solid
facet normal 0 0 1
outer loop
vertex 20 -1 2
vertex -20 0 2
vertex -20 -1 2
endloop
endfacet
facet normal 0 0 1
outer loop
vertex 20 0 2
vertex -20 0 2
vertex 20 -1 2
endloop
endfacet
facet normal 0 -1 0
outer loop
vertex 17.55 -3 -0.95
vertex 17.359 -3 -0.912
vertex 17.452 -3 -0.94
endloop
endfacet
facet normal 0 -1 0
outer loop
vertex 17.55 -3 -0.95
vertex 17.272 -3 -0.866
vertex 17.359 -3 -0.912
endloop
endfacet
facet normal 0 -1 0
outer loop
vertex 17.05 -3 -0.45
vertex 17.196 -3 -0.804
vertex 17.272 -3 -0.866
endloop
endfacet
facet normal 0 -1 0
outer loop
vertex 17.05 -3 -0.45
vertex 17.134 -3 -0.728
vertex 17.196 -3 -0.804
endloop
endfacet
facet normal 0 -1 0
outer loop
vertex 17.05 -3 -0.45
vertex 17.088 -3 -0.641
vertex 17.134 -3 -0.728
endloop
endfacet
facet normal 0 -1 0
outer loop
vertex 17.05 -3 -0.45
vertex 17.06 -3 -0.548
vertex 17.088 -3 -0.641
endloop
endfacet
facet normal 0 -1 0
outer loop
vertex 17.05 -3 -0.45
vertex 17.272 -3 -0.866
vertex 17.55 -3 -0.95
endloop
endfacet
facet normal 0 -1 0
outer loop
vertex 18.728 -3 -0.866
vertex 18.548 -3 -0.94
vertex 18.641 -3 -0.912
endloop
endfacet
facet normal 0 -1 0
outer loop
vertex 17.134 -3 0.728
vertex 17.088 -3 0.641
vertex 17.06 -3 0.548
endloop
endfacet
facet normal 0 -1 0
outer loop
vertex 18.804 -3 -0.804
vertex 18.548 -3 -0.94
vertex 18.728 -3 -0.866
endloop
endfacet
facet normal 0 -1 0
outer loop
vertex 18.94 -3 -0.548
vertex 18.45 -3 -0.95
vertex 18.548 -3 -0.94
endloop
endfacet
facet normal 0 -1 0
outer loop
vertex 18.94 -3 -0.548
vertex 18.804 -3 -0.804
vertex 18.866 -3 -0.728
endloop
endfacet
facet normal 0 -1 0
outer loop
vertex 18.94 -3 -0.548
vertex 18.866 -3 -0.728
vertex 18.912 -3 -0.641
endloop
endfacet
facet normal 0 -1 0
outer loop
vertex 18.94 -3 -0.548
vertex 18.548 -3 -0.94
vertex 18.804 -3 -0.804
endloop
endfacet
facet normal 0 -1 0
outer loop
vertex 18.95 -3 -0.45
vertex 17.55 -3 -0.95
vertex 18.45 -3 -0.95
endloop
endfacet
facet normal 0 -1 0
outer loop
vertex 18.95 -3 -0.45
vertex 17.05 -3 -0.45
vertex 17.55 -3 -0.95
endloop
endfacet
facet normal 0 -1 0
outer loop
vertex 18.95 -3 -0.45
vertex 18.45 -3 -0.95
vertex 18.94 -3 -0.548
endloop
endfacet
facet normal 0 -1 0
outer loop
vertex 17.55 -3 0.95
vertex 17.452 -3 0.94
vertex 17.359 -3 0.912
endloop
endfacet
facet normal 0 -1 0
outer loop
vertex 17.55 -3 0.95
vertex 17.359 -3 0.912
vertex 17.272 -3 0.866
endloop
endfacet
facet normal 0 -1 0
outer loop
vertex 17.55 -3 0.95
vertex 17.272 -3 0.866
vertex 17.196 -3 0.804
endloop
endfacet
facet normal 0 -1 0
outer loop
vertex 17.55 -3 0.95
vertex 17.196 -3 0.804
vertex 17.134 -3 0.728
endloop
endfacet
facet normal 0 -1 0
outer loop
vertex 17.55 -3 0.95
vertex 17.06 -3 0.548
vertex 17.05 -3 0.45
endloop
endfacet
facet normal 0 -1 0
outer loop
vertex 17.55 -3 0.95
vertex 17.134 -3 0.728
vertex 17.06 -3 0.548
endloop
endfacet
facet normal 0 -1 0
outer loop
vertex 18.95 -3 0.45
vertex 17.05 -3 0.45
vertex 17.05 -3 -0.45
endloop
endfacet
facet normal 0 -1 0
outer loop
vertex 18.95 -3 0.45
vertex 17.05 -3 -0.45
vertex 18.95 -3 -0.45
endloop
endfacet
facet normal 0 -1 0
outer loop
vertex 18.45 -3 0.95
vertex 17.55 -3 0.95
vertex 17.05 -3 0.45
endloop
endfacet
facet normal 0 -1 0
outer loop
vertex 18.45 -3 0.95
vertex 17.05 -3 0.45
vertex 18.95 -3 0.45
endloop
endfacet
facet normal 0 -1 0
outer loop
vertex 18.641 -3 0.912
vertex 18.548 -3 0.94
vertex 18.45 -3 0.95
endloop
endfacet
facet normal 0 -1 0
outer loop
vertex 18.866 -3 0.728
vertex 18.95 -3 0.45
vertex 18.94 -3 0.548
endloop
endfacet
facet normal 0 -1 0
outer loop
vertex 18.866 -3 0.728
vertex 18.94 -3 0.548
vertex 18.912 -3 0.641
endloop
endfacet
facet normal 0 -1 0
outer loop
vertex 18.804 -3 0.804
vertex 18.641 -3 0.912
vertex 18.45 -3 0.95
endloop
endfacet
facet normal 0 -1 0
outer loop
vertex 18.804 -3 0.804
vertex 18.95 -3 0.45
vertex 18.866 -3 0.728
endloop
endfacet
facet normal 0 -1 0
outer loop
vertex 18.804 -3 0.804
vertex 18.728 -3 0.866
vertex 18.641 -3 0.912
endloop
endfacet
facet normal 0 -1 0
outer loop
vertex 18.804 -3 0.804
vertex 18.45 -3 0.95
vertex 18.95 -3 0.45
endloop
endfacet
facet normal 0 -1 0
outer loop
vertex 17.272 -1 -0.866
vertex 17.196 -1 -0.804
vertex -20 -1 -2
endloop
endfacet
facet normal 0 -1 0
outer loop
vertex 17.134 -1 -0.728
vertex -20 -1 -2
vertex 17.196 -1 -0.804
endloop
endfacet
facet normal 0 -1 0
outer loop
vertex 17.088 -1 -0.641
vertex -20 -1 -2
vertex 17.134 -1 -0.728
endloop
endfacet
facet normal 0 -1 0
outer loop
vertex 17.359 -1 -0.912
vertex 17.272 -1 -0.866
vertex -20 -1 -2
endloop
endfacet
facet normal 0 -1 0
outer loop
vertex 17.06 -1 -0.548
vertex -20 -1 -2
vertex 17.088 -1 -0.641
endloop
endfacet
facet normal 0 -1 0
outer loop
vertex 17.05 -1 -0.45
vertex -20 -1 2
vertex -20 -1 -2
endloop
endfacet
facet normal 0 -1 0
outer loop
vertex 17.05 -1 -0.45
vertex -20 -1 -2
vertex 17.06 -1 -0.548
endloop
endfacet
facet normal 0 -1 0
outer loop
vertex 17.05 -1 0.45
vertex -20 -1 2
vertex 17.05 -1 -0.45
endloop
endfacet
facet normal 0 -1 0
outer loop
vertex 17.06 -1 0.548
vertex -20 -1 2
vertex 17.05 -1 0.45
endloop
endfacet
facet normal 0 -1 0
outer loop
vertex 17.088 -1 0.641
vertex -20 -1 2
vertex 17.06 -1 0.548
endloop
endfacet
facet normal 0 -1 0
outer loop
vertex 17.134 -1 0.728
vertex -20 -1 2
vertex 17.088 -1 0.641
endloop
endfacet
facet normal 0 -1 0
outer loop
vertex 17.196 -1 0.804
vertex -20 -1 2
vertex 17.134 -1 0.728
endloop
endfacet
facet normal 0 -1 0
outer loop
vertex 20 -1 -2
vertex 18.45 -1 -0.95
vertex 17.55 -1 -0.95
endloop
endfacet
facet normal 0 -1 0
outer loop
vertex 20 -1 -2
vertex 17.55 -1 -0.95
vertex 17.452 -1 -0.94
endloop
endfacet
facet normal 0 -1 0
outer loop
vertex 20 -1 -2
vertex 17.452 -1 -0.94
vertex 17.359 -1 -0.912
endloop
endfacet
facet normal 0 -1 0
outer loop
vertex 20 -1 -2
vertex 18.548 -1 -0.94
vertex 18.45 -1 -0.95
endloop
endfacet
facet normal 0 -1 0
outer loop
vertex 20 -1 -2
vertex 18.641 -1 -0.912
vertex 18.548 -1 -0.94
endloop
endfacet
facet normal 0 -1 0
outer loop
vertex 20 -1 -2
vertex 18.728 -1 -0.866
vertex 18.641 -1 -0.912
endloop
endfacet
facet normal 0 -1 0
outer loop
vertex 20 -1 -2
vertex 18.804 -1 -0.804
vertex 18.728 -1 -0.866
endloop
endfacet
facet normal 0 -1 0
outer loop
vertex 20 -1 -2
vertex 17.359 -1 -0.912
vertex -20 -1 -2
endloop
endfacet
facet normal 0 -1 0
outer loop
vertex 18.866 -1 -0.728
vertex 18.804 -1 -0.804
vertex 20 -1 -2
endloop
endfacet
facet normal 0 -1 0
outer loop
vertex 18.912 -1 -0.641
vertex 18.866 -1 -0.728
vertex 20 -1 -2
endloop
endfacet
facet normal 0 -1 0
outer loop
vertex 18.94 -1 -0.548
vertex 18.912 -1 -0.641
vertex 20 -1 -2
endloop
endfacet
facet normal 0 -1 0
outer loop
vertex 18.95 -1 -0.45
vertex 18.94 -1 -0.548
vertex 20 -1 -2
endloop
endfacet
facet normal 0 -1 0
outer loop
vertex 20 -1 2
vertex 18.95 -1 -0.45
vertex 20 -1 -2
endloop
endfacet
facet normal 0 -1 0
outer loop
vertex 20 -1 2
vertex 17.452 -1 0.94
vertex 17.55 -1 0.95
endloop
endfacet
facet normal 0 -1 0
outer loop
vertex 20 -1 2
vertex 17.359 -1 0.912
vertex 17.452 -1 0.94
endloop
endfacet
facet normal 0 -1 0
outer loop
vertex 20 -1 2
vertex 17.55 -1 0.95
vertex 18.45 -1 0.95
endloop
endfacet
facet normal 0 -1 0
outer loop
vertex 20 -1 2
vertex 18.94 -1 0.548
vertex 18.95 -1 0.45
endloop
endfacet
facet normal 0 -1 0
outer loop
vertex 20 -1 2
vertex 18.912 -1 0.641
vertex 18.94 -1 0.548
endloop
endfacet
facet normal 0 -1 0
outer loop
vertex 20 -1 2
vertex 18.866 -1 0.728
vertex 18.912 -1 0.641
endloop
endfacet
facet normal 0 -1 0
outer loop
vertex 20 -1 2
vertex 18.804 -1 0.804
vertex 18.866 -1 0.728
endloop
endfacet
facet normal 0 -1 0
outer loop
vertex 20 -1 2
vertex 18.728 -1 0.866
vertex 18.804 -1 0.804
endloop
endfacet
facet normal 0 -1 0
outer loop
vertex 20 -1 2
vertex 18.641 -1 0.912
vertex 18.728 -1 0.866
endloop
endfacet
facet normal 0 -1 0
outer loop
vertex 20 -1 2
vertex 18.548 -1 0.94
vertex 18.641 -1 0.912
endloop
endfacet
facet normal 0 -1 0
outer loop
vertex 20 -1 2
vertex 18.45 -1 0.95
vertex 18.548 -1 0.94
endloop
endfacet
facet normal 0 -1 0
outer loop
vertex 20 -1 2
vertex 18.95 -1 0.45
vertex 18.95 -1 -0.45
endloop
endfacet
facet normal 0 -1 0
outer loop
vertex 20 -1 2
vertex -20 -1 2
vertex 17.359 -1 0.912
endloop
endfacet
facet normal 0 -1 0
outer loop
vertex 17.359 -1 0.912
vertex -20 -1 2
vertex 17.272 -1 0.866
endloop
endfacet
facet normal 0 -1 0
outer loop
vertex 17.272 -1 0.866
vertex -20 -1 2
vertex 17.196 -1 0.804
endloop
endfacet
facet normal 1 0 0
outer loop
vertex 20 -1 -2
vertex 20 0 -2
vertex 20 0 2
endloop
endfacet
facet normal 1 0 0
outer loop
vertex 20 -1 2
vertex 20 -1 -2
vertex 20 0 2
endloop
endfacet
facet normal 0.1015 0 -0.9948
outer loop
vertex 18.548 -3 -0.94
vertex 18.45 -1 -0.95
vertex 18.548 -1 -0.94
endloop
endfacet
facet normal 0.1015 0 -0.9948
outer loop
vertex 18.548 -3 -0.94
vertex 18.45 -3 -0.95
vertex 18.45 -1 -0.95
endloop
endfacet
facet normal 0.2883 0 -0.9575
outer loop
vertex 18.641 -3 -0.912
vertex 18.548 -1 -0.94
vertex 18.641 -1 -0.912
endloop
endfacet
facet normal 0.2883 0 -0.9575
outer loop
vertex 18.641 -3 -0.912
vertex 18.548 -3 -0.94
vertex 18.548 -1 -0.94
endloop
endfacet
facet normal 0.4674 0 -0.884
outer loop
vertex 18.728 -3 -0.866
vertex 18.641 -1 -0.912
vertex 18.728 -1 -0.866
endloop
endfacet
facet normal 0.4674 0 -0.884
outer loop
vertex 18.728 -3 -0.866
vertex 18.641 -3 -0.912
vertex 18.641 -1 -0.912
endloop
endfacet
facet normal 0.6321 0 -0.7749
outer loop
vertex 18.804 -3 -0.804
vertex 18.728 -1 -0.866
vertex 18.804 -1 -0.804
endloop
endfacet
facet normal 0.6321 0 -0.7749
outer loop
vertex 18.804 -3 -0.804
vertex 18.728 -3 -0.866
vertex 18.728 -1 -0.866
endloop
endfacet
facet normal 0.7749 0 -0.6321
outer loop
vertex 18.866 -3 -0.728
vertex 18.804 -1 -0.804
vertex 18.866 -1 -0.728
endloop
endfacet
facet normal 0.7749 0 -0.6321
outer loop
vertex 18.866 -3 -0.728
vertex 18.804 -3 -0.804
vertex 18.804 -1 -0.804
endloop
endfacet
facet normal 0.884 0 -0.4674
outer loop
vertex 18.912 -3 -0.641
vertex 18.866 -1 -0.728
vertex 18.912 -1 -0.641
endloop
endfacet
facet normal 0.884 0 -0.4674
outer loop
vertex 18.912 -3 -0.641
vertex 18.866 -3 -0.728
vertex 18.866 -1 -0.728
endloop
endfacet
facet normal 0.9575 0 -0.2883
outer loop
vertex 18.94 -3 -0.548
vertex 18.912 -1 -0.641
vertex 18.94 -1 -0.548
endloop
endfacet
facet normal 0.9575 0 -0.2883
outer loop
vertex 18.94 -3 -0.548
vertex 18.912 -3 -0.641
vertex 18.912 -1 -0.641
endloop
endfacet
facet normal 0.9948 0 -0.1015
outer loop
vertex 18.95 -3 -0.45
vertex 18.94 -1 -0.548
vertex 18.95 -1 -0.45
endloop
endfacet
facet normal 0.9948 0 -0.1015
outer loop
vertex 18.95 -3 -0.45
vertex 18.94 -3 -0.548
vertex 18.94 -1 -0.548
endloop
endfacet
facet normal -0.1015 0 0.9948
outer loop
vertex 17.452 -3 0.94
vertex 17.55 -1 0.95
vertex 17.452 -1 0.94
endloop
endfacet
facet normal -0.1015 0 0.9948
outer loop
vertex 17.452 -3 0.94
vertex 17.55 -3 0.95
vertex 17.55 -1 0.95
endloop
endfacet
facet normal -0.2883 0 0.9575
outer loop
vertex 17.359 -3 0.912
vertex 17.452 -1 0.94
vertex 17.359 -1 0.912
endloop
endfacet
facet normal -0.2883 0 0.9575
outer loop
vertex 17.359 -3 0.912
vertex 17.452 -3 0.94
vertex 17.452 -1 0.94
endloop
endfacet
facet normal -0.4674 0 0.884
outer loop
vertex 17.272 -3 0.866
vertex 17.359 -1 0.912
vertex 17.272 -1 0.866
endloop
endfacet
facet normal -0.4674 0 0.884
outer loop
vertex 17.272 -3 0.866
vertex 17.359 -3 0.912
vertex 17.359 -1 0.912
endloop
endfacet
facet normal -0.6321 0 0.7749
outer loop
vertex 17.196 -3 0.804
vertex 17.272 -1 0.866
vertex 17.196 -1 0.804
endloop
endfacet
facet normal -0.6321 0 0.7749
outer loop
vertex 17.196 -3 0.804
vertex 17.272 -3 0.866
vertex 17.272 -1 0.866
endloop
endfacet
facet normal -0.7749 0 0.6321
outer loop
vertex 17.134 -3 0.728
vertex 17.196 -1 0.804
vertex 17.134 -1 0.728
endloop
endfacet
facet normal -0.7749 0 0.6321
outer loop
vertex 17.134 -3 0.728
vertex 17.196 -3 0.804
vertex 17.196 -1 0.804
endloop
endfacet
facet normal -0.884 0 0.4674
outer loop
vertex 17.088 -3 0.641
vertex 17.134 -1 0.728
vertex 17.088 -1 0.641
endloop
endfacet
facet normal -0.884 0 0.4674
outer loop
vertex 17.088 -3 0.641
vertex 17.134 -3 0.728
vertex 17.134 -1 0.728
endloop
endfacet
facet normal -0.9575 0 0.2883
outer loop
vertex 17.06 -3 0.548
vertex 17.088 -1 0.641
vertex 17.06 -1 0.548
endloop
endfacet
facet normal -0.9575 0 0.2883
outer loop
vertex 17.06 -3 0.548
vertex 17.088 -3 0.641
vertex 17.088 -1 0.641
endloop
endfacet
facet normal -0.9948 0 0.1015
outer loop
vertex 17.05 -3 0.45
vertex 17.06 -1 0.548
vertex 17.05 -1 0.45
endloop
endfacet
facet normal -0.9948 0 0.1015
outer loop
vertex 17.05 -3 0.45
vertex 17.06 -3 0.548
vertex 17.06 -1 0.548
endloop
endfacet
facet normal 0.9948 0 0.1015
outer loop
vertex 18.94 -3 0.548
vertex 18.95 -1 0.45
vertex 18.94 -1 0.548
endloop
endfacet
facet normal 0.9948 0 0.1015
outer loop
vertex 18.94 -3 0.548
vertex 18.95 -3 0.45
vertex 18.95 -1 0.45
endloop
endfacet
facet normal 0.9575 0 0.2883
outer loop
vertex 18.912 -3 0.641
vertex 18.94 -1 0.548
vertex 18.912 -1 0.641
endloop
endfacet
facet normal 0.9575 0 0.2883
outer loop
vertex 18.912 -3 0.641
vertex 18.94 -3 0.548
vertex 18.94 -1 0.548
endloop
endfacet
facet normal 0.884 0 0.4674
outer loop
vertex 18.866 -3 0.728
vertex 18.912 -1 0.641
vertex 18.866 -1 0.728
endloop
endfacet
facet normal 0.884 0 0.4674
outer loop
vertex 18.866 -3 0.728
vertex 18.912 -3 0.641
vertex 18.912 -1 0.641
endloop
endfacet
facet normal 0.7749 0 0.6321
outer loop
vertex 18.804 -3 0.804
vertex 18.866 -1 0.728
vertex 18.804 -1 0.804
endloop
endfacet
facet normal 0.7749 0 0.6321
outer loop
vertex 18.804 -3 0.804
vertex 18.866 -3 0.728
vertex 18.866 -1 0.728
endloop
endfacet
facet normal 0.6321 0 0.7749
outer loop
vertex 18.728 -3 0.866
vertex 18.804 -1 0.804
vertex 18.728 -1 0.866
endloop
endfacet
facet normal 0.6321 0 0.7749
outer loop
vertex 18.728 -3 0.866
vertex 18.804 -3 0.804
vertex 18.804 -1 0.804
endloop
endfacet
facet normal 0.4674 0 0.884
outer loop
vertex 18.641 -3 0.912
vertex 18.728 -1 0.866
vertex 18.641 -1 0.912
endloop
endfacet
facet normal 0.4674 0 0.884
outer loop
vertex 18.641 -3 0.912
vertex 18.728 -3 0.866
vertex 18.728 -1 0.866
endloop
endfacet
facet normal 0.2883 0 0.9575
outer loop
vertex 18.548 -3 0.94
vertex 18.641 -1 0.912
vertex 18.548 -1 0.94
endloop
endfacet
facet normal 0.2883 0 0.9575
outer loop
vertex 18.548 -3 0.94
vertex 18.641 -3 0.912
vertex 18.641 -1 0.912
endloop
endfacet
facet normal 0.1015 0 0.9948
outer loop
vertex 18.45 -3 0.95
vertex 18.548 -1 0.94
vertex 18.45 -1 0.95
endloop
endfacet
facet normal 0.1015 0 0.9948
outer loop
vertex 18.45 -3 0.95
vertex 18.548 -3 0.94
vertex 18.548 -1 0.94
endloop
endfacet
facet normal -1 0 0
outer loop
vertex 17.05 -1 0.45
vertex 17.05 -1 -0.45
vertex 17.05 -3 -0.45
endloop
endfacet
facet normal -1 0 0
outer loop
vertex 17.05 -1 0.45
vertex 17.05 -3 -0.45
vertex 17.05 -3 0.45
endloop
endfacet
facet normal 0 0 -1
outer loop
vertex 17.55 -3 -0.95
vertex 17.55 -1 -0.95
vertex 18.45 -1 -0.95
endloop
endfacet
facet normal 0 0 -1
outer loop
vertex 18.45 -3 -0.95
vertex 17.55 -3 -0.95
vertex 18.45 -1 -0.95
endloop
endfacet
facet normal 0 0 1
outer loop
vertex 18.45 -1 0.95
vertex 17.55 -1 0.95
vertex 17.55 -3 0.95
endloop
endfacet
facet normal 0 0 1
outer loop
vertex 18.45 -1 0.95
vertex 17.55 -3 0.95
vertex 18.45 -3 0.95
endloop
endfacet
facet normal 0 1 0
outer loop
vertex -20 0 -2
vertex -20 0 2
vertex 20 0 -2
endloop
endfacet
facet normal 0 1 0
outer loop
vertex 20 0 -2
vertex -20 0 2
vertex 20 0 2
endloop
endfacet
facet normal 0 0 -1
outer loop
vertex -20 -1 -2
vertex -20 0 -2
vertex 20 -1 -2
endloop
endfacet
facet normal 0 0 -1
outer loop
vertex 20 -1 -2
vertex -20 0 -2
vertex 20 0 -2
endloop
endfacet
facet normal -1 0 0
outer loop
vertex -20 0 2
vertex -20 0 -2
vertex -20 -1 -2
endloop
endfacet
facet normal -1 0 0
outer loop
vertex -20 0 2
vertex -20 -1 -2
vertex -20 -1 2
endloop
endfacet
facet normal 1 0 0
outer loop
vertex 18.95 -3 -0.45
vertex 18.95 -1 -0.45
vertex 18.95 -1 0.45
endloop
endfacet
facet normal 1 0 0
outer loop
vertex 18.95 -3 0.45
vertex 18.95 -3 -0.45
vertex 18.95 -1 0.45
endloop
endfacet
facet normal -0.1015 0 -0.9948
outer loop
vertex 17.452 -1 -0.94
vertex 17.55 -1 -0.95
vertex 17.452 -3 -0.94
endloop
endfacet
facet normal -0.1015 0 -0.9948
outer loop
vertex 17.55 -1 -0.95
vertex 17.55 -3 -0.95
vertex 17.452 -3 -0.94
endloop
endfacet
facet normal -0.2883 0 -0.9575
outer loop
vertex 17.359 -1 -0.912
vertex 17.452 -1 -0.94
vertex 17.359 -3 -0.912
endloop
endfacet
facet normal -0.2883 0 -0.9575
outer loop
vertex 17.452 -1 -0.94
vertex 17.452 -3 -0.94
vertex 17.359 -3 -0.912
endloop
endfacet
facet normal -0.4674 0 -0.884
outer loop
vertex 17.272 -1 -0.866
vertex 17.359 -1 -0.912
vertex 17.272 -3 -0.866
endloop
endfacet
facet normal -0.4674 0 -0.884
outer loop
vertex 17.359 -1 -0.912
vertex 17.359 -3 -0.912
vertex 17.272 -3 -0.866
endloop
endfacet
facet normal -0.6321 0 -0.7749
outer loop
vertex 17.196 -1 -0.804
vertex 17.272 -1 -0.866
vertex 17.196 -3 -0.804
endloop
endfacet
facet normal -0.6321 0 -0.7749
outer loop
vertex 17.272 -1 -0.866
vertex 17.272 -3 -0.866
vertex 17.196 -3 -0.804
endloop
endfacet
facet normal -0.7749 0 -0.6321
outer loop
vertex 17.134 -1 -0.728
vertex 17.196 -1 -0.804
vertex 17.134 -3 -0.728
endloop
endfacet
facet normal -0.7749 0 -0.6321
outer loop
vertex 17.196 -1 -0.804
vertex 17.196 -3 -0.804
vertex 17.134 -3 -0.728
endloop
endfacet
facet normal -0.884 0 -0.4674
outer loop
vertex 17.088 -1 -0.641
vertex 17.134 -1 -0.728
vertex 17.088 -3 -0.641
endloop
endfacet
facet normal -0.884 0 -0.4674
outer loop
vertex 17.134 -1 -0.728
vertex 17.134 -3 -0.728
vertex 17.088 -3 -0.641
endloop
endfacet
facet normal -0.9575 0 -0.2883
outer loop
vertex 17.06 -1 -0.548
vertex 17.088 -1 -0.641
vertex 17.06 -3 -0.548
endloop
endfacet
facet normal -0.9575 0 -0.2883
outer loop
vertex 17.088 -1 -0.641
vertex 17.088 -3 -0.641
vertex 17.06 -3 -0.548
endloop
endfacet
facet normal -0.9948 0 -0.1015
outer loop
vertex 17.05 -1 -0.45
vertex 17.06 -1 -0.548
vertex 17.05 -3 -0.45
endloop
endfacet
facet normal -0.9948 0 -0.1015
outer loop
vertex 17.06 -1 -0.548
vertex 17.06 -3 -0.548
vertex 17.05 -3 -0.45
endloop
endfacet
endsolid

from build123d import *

# Parameters (mm, degrees)
F0_W     = 40
F0_H     = 4
F0_W_2   = 1.9
F0_H_2   = 1.9
F1_DEPTH = 1
F2_W     = 1.9
F2_H     = 1.9
F3_DEPTH = 2
F4_R     = 0.5


with BuildPart() as f1:
    # F0 (on Front) → F1 (new body)
    with BuildSketch(Plane.XZ):
        Rectangle(F0_W, F0_H)
        with Locations((17.95, 0)):
            Rectangle(F0_W_2, F0_H_2, mode=Mode.SUBTRACT)
        with Locations((17.95, 0)):
            Rectangle(F0_W_2, F0_H_2)
    extrude(amount=F1_DEPTH)

    # F2 (on face) → F3 (join)
    with BuildSketch(Plane.XZ.offset(1)):
        with Locations((18, 0)):
            Rectangle(F2_W, F2_H)
    extrude(amount=F3_DEPTH)

    # F4
    f4_edges = [f1.edges().sort_by_distance(p)[0] for p in [
        (18.95, -2, 0.95),
        (17.05, -2, 0.95),
        (18.95, -2, -0.95),
        (17.05, -2, -0.95),
    ]]
    fillet(f4_edges, radius=F4_R)


solid = f1.part
